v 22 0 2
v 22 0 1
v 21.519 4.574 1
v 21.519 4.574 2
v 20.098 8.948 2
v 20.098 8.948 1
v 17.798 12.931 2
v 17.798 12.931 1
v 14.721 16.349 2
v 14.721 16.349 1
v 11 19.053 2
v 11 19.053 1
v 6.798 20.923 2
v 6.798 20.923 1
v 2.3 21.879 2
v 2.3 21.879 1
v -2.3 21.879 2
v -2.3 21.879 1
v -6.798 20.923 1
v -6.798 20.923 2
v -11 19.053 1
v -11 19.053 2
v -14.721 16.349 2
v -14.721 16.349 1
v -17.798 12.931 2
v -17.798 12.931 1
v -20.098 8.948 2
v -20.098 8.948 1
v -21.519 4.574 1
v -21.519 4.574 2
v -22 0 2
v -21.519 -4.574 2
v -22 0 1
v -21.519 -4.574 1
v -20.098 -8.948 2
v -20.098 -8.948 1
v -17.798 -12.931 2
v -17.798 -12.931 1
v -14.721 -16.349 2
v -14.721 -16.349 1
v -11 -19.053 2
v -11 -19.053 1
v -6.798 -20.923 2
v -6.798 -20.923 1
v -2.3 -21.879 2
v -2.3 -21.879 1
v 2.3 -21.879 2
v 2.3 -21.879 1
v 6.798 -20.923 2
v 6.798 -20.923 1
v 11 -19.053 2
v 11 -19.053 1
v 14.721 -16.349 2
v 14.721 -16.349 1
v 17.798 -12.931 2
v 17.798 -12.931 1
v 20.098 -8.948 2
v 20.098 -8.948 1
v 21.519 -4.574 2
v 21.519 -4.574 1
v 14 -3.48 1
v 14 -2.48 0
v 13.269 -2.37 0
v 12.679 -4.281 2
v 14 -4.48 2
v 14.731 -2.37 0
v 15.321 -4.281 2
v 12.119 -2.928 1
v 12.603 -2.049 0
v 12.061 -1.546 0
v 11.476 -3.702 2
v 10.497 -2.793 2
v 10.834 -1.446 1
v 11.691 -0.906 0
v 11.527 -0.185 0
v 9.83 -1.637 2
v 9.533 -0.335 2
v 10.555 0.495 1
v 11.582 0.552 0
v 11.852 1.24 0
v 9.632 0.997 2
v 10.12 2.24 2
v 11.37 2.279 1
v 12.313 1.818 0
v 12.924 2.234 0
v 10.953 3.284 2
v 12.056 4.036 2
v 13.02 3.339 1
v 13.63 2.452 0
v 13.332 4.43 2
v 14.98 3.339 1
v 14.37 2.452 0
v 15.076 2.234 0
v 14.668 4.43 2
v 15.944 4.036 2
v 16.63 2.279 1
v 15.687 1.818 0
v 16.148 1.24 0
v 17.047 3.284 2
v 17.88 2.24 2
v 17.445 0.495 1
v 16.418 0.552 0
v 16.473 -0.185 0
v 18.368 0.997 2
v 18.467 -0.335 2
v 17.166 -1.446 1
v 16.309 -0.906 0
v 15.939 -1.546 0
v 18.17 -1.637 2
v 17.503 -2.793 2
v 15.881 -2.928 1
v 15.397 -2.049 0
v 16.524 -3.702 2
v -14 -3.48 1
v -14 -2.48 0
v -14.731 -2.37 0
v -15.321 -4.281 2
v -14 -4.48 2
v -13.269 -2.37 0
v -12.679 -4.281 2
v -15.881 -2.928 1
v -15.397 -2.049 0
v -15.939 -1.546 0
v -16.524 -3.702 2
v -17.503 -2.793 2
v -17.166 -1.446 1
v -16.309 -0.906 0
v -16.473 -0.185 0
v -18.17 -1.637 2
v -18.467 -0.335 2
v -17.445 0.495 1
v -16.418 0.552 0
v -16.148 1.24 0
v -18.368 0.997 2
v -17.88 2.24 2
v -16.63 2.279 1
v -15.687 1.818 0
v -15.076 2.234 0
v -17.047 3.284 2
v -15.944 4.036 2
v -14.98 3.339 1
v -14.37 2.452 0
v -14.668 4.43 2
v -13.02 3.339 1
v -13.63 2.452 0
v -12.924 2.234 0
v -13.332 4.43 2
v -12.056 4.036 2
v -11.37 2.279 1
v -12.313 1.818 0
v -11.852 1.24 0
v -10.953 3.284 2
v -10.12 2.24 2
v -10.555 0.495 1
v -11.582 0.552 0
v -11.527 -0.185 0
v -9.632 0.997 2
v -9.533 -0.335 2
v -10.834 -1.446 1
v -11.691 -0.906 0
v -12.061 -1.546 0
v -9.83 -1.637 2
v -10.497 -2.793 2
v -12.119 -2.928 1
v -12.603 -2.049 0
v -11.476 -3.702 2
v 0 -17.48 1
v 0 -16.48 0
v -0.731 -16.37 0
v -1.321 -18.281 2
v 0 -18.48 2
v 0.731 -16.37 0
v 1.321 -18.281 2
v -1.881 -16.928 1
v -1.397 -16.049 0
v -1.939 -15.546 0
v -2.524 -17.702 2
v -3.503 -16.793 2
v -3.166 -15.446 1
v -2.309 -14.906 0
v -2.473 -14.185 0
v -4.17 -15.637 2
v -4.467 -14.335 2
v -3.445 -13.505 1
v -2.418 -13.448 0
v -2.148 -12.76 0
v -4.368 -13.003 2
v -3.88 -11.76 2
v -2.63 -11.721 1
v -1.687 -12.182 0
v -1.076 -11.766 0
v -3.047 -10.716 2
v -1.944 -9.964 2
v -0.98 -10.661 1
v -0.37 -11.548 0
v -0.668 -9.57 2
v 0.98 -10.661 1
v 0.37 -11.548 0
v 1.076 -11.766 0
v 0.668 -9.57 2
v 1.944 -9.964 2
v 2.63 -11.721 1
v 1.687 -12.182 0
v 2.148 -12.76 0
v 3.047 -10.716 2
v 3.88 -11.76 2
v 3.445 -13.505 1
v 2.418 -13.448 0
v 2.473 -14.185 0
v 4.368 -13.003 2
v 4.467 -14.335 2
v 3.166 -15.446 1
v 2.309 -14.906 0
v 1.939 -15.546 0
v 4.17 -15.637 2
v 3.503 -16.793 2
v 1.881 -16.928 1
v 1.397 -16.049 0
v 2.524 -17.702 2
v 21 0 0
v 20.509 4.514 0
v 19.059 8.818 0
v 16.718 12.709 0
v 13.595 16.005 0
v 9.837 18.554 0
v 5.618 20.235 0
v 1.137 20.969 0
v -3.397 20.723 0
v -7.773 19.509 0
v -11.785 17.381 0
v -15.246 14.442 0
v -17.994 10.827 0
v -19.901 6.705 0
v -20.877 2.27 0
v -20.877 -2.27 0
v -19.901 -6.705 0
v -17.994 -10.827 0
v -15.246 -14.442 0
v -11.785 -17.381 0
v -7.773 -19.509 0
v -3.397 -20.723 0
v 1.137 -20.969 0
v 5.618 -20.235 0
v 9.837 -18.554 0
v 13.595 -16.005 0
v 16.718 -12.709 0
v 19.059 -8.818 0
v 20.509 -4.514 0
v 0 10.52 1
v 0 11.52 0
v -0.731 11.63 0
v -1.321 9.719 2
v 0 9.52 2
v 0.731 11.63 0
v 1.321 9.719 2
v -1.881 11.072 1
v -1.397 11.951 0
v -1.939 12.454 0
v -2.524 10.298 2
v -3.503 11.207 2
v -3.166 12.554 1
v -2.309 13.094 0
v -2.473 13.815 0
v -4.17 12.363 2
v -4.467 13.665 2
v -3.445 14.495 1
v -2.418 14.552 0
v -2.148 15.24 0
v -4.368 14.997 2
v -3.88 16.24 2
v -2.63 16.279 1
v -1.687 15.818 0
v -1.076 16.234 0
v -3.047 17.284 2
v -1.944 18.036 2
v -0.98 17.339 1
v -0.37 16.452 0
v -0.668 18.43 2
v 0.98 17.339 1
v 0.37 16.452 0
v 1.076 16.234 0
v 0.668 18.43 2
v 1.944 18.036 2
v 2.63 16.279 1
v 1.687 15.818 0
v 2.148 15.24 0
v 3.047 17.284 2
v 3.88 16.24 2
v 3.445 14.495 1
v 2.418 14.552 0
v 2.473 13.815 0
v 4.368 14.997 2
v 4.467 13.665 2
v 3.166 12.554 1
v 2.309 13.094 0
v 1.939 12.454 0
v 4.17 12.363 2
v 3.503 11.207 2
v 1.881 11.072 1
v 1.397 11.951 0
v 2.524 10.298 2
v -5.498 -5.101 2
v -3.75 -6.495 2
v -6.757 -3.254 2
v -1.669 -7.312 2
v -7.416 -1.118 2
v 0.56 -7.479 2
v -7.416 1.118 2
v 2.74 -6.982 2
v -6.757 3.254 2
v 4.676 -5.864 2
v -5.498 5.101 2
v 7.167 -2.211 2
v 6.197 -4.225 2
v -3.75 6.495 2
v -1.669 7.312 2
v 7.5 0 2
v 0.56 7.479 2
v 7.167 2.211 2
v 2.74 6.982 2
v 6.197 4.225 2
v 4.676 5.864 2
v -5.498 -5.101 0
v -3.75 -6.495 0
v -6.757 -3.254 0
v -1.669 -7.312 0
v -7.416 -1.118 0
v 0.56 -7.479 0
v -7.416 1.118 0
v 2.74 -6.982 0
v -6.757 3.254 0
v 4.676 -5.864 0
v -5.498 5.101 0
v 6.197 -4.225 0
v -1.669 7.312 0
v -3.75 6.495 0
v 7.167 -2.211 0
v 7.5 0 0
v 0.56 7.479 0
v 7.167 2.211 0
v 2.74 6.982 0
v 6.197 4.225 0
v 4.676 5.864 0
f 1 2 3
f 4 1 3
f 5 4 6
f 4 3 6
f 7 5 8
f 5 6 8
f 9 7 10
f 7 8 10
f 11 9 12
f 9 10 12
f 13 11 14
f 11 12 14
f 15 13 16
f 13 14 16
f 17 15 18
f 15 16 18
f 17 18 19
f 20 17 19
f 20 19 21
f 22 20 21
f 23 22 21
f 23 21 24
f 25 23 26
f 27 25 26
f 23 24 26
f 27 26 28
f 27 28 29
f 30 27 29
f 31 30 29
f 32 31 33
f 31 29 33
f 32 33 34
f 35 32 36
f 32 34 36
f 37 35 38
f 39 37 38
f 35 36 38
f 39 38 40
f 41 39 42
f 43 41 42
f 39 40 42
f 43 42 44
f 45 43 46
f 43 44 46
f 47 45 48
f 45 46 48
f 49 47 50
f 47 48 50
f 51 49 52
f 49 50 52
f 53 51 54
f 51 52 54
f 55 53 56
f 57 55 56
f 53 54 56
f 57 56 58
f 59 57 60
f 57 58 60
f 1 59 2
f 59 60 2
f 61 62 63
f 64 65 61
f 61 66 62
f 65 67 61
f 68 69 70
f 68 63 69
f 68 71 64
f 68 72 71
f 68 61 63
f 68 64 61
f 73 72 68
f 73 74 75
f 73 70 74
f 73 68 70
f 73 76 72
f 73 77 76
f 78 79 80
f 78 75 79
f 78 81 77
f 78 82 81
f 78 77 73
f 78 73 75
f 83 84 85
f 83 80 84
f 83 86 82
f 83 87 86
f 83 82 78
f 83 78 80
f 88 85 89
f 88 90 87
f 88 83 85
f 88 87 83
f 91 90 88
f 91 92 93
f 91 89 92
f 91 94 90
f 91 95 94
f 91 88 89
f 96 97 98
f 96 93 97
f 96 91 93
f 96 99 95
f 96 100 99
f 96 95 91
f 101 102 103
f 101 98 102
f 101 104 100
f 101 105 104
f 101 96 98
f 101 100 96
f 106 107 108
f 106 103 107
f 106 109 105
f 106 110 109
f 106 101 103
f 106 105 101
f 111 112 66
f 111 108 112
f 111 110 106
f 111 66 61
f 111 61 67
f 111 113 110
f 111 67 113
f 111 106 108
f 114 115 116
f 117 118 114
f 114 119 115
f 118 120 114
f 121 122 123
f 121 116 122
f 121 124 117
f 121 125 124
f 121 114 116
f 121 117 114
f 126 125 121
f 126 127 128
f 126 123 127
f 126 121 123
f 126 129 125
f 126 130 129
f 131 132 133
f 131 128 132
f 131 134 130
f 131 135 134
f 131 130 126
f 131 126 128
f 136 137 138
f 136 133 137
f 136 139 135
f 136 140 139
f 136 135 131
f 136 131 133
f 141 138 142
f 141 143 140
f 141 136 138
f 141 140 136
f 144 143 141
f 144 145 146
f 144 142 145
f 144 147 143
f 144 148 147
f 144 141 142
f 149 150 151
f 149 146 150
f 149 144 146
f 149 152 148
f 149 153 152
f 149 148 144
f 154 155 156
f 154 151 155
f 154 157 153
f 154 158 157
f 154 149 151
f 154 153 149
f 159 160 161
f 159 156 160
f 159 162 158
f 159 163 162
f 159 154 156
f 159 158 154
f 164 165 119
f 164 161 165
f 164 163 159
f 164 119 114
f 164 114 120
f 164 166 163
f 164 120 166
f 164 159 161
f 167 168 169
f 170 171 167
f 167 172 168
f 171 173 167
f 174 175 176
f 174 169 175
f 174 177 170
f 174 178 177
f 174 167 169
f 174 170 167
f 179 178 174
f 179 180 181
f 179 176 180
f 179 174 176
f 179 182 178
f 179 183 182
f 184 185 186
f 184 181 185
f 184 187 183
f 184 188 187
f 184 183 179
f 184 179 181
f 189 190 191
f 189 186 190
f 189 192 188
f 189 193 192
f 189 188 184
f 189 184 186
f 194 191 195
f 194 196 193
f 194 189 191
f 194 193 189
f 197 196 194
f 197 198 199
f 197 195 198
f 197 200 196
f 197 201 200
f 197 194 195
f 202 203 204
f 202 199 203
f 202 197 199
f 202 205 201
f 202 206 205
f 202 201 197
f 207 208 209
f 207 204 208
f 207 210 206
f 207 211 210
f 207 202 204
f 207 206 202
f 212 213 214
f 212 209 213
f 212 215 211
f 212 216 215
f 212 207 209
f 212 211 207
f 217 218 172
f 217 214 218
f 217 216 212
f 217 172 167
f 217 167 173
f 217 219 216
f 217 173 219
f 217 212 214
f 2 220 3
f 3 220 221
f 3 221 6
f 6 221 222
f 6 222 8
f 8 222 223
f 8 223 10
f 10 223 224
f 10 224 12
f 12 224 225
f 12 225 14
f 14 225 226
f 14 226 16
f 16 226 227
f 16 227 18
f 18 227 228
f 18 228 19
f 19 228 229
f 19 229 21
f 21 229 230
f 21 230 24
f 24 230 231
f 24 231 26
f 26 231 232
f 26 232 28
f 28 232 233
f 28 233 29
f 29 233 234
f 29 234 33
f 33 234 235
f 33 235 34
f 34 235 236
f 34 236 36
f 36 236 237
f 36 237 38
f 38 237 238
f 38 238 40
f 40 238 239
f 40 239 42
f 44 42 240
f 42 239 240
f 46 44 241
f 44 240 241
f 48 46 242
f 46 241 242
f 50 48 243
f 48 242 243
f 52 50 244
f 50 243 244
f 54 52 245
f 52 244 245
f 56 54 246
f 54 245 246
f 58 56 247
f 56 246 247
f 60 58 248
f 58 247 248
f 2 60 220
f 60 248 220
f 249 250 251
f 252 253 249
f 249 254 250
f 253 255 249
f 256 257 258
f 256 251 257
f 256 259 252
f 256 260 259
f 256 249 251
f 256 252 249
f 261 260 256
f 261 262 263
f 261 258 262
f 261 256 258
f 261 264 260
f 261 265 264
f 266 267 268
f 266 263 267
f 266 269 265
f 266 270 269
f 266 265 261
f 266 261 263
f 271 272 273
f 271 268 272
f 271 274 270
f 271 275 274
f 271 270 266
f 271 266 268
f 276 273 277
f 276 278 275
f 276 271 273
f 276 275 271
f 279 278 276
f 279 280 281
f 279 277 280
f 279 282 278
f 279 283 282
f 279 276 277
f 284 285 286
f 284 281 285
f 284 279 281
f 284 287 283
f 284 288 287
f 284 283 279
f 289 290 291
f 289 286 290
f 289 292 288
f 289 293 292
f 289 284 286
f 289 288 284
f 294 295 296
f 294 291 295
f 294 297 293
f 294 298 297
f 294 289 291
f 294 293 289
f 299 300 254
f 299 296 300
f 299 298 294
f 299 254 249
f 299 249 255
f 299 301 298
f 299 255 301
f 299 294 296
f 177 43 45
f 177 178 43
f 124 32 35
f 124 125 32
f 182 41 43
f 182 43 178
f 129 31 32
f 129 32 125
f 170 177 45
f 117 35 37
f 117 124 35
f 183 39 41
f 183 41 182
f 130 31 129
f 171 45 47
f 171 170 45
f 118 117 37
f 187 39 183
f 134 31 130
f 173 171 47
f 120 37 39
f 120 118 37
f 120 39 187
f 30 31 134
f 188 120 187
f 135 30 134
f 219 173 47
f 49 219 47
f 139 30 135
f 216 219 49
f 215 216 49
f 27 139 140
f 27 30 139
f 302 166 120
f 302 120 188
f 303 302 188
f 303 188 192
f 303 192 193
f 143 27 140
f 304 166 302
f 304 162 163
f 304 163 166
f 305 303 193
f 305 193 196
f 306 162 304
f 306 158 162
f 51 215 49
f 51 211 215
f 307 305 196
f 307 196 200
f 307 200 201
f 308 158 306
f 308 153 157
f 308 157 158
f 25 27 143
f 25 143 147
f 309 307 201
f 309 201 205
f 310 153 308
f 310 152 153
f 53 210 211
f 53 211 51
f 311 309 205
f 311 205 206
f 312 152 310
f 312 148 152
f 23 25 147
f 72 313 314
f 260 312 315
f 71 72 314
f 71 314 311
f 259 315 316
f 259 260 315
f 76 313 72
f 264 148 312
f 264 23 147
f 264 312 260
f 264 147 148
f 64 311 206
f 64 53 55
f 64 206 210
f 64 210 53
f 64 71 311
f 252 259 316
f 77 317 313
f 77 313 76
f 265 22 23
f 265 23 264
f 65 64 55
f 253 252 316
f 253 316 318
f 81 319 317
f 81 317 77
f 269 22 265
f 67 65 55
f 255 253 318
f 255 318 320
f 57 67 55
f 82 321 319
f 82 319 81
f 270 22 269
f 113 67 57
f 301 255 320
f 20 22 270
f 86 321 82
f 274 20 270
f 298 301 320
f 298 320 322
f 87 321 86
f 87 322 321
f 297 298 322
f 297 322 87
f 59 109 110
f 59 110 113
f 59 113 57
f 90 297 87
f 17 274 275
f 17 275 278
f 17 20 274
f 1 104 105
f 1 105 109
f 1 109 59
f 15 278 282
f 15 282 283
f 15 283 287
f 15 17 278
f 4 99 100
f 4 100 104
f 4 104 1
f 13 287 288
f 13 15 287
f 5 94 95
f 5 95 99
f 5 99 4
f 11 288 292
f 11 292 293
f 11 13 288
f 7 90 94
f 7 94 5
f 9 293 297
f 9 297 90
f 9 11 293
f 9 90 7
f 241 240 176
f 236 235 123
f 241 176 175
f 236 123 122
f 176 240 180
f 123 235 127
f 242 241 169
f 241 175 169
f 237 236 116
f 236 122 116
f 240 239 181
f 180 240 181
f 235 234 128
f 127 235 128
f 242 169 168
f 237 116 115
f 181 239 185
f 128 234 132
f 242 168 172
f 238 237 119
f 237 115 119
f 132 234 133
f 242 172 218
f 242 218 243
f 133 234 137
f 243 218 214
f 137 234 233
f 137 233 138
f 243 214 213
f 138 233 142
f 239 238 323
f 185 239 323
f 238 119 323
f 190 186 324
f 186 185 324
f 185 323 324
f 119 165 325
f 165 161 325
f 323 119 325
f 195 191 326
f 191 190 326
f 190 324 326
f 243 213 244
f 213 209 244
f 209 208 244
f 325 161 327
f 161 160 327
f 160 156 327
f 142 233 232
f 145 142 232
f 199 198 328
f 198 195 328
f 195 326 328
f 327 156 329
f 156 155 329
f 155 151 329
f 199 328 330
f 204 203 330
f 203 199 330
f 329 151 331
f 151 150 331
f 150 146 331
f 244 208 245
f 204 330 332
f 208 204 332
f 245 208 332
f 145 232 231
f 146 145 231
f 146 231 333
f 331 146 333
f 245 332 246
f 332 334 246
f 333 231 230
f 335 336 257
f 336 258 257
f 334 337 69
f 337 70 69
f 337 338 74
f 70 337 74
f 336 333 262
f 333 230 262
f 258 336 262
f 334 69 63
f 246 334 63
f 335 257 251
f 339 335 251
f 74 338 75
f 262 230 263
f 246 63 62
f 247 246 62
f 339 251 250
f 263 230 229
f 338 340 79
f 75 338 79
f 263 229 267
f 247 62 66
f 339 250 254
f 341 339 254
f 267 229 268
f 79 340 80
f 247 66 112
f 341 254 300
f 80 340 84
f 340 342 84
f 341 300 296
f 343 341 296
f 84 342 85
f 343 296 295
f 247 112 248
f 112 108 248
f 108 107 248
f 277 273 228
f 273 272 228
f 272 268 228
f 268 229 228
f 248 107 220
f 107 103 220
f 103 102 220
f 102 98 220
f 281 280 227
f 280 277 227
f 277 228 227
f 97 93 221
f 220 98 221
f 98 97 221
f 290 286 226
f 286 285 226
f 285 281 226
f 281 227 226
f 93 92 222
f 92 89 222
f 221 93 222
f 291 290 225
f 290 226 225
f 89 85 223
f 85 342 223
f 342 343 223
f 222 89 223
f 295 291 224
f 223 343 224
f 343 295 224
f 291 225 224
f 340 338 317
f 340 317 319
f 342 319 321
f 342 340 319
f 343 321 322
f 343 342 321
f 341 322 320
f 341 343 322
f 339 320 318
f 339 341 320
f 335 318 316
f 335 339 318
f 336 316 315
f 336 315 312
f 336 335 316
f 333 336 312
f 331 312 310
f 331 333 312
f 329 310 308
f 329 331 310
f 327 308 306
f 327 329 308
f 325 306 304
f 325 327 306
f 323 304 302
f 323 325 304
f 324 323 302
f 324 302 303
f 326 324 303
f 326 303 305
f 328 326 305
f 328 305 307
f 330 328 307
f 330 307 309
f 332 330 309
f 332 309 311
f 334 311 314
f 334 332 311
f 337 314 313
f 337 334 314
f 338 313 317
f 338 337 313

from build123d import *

# Parameters (mm, degrees)
SKETCH_1_R                  = 22
SKETCH_1_R_2                = 7.5
EXTRUDE_1_DEPTH             = 2
CHAMFER_1_SIZE              = 1
HOLE_WIZARD_M4_1_AT_2_COUNT = 2
HOLE_WIZARD_M4_1_AT_2_PITCH = 28
HOLE_WIZARD_M4_1_AT_3_COUNT = 2
HOLE_WIZARD_M4_1_AT_3_PITCH = 19.798989873
HOLE_WIZARD_M4_1_AT_4_COUNT = 2
HOLE_WIZARD_M4_1_AT_4_PITCH = 19.798989873


with BuildPart() as part:
    # 草图1 → 凸台-拉伸1 (new body)
    with BuildSketch(Plane.XY):
        Circle(SKETCH_1_R)
        Circle(SKETCH_1_R_2, mode=Mode.SUBTRACT)
    extrude(amount=EXTRUDE_1_DEPTH)

    # 倒角1
    chamfer_1_edges = [part.edges().sort_by_distance(p)[0] for p in [
        (-22, 0, 0),
    ]]
    chamfer(chamfer_1_edges, length=CHAMFER_1_SIZE)

    # 草图2 → M4 六角凹锥坑螺钉的锥形沉头孔1 (revolve, cut)
    with BuildSketch(Plane(origin=(0, 14, 2), x_dir=(0, -1, 0), z_dir=(1, 0, 0))):
        Polygon((0, 0), (0, 2), (2.25, 2), (2.25, 2.23), (4.48, 0), align=None)
    hole_wizard_m4_1 = revolve(axis=Axis((0, 14, 8.35), (0, 0, -1)), mode=Mode.SUBTRACT)

    # M4 六角凹锥坑螺钉的锥形沉头孔1 at 2: M4 六角凹锥坑螺钉的锥形沉头孔1 ×2
    with Locations(*[(0, -i * HOLE_WIZARD_M4_1_AT_2_PITCH, 0) for i in range(1, HOLE_WIZARD_M4_1_AT_2_COUNT)]):
        add(hole_wizard_m4_1, mode=Mode.SUBTRACT)

    # M4 六角凹锥坑螺钉的锥形沉头孔1 at 3: M4 六角凹锥坑螺钉的锥形沉头孔1 ×2
    with Locations(*[Vector(-0.7071067811865476, -0.7071067811865476, 0) * (i * HOLE_WIZARD_M4_1_AT_3_PITCH) for i in range(1, HOLE_WIZARD_M4_1_AT_3_COUNT)]):
        add(hole_wizard_m4_1, mode=Mode.SUBTRACT)

    # M4 六角凹锥坑螺钉的锥形沉头孔1 at 4: M4 六角凹锥坑螺钉的锥形沉头孔1 ×2
    with Locations(*[Vector(0.7071067811865475, -0.7071067811865476, 0) * (i * HOLE_WIZARD_M4_1_AT_4_PITCH) for i in range(1, HOLE_WIZARD_M4_1_AT_4_COUNT)]):
        add(hole_wizard_m4_1, mode=Mode.SUBTRACT)


solid = part.part
